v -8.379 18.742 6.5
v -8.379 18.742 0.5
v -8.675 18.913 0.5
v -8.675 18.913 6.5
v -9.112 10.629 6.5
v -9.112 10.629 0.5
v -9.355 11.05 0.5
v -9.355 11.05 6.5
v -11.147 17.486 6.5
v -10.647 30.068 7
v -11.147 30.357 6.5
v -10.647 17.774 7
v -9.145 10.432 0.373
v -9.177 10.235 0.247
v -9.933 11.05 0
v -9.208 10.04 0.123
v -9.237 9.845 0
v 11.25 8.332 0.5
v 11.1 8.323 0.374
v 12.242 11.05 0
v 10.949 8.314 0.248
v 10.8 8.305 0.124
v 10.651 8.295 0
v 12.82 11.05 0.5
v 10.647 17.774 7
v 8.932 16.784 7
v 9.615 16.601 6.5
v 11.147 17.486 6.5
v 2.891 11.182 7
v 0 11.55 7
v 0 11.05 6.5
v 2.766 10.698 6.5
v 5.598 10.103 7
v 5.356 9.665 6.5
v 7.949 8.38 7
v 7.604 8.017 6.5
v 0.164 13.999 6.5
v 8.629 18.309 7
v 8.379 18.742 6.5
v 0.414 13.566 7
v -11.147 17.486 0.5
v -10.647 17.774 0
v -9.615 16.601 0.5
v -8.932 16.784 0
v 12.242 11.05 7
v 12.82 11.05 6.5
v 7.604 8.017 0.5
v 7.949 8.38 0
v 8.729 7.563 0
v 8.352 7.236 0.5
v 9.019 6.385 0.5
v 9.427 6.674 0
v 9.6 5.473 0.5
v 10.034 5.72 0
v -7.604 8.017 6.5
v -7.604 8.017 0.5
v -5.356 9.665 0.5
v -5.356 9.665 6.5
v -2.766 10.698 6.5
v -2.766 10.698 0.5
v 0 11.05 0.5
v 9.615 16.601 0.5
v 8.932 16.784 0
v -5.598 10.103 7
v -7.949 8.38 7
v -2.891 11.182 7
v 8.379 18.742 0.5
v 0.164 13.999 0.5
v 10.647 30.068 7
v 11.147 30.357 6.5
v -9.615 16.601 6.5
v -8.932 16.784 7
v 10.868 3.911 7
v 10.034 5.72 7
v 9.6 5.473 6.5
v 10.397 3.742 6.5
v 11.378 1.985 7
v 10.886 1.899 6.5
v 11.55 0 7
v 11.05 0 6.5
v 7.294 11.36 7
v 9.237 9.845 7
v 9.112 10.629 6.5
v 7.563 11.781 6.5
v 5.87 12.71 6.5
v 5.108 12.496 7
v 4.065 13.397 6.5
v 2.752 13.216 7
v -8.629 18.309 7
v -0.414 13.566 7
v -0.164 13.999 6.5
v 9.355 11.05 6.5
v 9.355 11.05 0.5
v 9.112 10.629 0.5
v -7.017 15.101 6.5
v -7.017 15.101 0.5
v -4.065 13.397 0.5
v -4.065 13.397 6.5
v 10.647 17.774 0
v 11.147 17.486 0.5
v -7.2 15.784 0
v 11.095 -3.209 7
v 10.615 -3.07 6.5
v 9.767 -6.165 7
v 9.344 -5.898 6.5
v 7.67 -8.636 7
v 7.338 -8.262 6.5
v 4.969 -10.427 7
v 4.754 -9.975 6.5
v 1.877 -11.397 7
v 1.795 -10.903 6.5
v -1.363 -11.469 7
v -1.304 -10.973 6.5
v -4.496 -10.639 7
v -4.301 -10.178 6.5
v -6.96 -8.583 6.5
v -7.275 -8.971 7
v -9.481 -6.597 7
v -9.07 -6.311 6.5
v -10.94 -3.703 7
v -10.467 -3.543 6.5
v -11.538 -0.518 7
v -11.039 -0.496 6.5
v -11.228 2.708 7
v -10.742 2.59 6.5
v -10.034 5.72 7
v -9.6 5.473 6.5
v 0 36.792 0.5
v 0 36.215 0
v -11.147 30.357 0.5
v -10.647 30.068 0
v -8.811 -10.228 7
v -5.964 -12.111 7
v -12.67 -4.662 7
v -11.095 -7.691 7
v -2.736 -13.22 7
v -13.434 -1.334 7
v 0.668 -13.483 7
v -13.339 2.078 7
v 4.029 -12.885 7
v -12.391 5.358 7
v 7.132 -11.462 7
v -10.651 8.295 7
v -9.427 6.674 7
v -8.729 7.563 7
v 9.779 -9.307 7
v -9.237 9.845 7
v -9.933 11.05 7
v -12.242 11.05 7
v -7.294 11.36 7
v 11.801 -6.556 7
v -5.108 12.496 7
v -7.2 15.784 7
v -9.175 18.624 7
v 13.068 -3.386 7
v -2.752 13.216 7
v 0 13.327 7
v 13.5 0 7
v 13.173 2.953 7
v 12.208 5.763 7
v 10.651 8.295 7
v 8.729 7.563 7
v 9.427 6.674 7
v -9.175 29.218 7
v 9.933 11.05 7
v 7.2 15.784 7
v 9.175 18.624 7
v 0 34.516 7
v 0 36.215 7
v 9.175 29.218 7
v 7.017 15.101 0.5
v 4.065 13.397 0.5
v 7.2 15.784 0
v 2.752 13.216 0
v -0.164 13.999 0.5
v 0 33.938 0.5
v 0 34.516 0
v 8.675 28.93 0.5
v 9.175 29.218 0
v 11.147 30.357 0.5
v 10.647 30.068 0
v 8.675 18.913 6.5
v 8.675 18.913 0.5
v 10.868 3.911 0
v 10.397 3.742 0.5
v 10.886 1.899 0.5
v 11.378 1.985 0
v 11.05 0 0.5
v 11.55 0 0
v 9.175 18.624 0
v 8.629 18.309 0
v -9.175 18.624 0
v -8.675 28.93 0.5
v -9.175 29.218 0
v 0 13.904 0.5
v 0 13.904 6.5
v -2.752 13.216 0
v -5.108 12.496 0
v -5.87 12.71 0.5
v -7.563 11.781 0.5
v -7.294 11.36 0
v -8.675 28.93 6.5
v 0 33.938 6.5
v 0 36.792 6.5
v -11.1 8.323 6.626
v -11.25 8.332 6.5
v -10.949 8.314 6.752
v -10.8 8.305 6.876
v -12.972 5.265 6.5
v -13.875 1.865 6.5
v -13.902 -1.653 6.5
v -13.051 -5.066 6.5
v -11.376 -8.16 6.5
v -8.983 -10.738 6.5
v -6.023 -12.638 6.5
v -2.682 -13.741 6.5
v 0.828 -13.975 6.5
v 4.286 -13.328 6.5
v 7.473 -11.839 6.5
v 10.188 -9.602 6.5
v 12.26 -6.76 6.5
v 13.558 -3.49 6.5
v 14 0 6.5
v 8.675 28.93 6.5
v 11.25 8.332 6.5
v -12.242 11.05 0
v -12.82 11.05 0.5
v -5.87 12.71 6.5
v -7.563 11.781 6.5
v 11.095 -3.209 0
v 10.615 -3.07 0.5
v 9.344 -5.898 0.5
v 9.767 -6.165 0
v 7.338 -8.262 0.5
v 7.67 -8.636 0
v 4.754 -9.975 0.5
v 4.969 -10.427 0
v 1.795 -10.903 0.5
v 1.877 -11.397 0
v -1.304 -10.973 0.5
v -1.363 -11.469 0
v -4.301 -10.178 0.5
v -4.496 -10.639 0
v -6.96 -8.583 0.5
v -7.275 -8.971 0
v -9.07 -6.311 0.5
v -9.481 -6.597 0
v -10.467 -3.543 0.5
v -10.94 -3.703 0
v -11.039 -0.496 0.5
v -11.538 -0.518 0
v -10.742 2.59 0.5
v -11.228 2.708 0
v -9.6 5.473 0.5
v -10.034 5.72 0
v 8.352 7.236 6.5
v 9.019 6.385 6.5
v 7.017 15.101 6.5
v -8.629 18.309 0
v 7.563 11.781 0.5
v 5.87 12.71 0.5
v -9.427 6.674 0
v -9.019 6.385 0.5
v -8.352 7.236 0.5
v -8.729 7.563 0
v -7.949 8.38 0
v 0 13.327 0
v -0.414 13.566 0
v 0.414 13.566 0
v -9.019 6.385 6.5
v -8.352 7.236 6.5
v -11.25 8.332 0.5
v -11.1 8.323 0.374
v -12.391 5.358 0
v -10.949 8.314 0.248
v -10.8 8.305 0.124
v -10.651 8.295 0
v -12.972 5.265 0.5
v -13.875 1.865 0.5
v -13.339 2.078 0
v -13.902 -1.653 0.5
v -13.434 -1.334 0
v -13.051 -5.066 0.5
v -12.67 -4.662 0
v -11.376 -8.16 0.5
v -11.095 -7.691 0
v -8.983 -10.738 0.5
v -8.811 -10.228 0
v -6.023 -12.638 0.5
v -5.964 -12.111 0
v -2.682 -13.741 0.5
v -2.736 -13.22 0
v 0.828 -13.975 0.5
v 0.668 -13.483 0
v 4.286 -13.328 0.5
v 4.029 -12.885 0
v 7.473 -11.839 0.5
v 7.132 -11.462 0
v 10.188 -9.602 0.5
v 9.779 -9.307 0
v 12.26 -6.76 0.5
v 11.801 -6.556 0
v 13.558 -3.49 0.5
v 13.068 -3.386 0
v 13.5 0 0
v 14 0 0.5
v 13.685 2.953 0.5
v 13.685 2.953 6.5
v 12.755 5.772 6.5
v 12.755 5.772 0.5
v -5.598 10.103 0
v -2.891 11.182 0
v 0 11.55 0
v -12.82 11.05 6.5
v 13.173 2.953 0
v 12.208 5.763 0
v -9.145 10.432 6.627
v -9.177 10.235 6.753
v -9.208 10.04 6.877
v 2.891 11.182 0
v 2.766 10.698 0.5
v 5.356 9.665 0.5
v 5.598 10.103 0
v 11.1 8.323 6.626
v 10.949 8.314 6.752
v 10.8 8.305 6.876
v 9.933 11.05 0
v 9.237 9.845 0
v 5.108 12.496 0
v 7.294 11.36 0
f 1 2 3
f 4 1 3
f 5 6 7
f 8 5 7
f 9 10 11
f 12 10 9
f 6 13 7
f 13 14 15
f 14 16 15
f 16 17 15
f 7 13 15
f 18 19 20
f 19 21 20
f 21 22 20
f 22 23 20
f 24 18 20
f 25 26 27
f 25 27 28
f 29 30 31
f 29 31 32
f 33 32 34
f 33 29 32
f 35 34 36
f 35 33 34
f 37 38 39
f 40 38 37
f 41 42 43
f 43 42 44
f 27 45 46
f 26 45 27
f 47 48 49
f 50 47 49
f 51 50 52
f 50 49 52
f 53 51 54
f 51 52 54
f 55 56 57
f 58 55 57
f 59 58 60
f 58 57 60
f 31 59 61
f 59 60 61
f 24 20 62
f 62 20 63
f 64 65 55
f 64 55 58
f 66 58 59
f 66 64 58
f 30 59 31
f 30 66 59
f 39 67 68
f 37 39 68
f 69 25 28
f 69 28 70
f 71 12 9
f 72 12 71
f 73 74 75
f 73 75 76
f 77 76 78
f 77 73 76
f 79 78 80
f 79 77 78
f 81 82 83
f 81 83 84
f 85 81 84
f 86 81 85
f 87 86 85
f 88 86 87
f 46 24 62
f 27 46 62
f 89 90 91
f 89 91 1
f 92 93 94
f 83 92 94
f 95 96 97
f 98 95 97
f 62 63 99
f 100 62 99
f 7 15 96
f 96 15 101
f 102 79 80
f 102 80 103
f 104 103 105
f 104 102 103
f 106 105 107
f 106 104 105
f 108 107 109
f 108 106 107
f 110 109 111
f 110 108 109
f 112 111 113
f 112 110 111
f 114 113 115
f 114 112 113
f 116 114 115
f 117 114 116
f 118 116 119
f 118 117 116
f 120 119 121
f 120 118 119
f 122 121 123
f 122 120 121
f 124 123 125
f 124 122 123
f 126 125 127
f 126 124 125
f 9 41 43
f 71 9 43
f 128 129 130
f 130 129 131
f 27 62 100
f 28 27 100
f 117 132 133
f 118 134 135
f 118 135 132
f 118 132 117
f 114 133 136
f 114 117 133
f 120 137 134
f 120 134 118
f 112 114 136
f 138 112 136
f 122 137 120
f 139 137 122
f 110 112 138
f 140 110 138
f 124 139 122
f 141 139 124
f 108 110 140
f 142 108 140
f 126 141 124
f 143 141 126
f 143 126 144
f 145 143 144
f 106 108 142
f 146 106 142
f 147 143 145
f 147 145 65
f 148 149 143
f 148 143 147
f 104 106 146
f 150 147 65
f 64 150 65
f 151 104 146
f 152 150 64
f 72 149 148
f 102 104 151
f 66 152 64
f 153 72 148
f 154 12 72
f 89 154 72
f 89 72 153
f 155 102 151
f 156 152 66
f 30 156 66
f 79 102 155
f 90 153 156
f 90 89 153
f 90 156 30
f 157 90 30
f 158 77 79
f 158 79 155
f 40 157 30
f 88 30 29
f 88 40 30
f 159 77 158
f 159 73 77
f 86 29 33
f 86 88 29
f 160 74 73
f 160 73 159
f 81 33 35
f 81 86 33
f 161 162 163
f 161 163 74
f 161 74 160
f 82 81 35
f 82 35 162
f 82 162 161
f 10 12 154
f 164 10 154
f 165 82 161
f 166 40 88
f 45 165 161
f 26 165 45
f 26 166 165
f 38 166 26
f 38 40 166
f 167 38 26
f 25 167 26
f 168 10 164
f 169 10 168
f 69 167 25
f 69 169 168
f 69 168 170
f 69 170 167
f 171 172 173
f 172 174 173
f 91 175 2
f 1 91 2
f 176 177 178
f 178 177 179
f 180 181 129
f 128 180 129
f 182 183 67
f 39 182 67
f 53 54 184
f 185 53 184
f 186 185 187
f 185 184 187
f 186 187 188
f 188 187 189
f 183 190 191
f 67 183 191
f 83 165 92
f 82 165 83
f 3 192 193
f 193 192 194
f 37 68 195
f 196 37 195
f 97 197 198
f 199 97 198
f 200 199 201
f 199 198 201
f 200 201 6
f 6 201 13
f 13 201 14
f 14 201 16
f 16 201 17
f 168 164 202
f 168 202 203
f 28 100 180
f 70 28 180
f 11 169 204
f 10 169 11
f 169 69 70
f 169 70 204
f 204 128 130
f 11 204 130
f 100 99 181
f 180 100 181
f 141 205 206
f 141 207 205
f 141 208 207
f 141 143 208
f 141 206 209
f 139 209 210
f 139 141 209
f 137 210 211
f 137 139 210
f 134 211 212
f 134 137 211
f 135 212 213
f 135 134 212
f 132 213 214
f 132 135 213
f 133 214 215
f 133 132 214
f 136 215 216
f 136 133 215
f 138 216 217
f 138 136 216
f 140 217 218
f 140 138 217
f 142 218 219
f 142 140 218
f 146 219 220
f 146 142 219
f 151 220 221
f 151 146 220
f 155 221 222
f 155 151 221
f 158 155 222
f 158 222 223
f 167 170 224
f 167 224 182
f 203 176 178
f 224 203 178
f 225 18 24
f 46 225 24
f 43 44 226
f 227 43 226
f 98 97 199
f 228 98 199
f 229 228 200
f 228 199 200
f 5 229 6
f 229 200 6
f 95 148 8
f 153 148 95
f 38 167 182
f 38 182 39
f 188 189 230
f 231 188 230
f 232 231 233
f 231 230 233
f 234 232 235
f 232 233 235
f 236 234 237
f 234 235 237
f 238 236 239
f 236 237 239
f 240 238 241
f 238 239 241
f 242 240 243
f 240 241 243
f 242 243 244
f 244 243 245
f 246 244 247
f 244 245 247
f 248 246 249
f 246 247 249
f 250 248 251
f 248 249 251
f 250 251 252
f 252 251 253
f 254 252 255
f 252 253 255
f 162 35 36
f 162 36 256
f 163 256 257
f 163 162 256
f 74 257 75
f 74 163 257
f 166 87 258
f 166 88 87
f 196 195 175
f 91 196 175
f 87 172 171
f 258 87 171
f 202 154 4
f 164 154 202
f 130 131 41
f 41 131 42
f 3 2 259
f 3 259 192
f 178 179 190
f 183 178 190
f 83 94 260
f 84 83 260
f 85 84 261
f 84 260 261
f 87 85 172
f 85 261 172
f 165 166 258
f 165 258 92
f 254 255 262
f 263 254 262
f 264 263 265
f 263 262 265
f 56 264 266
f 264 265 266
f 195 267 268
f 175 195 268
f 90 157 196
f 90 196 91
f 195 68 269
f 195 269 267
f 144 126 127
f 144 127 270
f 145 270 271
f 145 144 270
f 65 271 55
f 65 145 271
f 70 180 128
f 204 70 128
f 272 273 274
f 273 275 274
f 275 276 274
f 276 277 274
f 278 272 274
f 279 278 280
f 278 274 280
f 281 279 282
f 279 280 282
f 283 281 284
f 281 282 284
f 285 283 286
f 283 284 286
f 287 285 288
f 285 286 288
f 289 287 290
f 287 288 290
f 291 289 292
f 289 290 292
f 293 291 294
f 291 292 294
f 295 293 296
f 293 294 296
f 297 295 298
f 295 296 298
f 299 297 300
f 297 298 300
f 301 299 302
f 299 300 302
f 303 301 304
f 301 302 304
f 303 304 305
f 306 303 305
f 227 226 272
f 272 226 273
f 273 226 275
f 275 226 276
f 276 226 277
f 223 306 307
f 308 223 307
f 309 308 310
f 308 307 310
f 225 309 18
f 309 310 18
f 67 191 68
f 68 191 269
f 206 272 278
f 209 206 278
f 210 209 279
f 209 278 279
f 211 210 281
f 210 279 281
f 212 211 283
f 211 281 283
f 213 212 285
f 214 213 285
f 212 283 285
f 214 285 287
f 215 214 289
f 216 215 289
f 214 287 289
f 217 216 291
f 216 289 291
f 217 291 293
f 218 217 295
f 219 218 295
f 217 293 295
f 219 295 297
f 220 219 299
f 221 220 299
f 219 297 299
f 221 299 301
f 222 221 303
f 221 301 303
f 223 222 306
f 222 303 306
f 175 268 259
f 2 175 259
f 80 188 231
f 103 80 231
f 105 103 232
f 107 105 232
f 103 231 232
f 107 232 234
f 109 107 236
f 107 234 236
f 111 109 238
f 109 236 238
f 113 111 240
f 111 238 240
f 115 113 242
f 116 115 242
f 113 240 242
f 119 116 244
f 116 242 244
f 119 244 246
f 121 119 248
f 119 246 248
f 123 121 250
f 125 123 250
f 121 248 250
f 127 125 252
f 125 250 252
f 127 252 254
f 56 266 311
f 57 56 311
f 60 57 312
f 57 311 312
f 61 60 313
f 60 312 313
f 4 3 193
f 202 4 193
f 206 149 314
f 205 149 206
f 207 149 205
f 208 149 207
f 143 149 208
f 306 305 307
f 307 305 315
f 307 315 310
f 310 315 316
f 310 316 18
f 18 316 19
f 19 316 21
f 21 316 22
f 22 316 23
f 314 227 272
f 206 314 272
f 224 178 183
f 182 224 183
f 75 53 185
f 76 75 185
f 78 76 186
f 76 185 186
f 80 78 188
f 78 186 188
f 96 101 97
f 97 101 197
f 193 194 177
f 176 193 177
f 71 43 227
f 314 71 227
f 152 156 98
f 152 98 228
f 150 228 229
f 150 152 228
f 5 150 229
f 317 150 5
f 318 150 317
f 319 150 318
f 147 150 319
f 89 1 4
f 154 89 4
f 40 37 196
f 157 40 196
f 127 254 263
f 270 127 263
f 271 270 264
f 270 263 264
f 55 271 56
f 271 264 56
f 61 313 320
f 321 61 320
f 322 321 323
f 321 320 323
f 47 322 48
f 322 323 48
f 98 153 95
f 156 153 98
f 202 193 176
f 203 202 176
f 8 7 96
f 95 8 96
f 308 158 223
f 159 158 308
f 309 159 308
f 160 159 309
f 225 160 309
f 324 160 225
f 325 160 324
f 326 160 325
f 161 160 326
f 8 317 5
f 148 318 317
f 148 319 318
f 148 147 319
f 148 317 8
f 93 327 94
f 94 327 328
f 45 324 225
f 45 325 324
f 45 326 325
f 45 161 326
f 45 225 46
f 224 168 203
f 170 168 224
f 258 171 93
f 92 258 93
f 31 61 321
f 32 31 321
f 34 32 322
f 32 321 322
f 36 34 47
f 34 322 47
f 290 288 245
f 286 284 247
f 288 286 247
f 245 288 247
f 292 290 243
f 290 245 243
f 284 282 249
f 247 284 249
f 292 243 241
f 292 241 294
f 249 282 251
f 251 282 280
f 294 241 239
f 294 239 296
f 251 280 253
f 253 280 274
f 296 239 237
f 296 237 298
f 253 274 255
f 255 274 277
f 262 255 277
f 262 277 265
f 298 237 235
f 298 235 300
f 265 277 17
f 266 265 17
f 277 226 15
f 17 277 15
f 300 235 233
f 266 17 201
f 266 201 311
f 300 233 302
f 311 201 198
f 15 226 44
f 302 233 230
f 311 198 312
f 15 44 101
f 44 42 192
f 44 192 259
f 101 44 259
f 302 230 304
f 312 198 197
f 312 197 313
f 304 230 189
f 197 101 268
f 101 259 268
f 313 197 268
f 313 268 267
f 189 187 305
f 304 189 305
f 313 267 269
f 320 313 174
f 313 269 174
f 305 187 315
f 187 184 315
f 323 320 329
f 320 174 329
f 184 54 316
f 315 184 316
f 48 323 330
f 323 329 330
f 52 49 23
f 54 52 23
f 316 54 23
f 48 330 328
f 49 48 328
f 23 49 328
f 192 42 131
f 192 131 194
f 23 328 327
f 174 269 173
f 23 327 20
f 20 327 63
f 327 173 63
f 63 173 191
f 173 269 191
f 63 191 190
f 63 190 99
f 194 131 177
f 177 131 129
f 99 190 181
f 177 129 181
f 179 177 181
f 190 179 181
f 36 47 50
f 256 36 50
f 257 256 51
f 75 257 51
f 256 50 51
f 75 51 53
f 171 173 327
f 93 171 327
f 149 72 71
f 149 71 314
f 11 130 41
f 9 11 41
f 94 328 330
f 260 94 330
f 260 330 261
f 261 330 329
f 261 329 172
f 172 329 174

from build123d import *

# Parameters (mm, degrees)
F1_DEPTH = 7
F2_SIZE  = 0.5


with BuildPart() as f1:
    # F0 (on Top) → F1 (new body)
    with BuildSketch(Plane.XY):
        Polygon((8.378810594, 18.741624645), (9.614679115, 16.6010375752), (11.146737042, 17.4855716318), (11.146737042, 30.3567148954), (0, 36.7922865272), (-11.146737042, 30.3567148954), (-11.146737042, 17.4855716318), (-9.614679115, 16.6010375752), (-8.378810594, 18.741624645), (-8.675, 18.9126296784), (-8.675, 28.9296568488), (0, 33.938170434), (8.675, 28.9296568488), (8.675, 18.9126296784), align=None)
        with BuildLine():
            Line((-4.0649183257, 13.3968816896), (0, 11.05))
            Line((0, 11.05), (4.0649183257, 13.3968816896))
            ThreePointArc((4.0649183257, 13.3968816896), (2.1359865208, 13.8360963275), (0.1644037795, 13.9990346595))
            Line((0.1644037795, 13.9990346595), (0, 13.9041160931))
            Line((0, 13.9041160931), (-0.1644037795, 13.9990346595))
            ThreePointArc((-0.1644037795, 13.9990346595), (-2.1359865208, 13.8360963275), (-4.0649183257, 13.3968816896))
        make_face()
        with BuildLine():
            ThreePointArc((9.1121955979, 10.6286354433), (10.2458784466, 9.5405437401), (11.2504851637, 8.3322616126))
            Line((11.2504851637, 8.3322616126), (12.8195721533, 11.05))
            Line((12.8195721533, 11.05), (9.614679115, 16.6010375752))
            Line((9.614679115, 16.6010375752), (7.0166029036, 15.1010375752))
            Line((7.0166029036, 15.1010375752), (9.3554705381, 11.05))
            Line((9.3554705381, 11.05), (9.1121955979, 10.6286354433))
        make_face()
        with BuildLine():
            ThreePointArc((7.6044558373, 8.0171535733), (8.6955707884, 6.8183244762), (9.5995515555, 5.4727607232))
            Line((9.5995515555, 5.4727607232), (11.2504851637, 8.3322616126))
            ThreePointArc((11.2504851637, 8.3322616126), (10.2458784466, 9.5405437401), (9.1121955979, 10.6286354433))
            Line((9.1121955979, 10.6286354433), (7.6044558373, 8.0171535733))
        make_face()
        with BuildLine():
            ThreePointArc((0, 11.05), (4.0934675408, 10.2638210961), (7.6044558373, 8.0171535733))
            Line((7.6044558373, 8.0171535733), (9.1121955979, 10.6286354433))
            ThreePointArc((9.1121955979, 10.6286354433), (6.7323754841, 12.2749794436), (4.0649183257, 13.3968816896))
            Line((4.0649183257, 13.3968816896), (0, 11.05))
        make_face()
        with BuildLine():
            Line((-9.1121955979, 10.6286354433), (-7.6044558373, 8.0171535733))
            ThreePointArc((-7.6044558373, 8.0171535733), (-4.0934675408, 10.2638210961), (0, 11.05))
            Line((0, 11.05), (-4.0649183257, 13.3968816896))
            ThreePointArc((-4.0649183257, 13.3968816896), (-6.7323754841, 12.2749794436), (-9.1121955979, 10.6286354433))
        make_face()
        with BuildLine():
            ThreePointArc((9.5995515555, 5.4727607232), (10.6812345889, 2.8308528142), (11.05, 0))
            ThreePointArc((11.05, 0), (-2.8308528142, -10.6812345889), (-9.5995515555, 5.4727607232))
            Line((-9.5995515555, 5.4727607232), (-11.2504851637, 8.3322616126))
            ThreePointArc((-11.2504851637, 8.3322616126), (-4.3870951499, -13.2948635249), (14, 0))
            ThreePointArc((14, 0), (13.2948635249, 4.3870951499), (11.2504851637, 8.3322616126))
            Line((11.2504851637, 8.3322616126), (9.5995515555, 5.4727607232))
        make_face()
        with BuildLine():
            Line((-11.2504851637, 8.3322616126), (-9.5995515555, 5.4727607232))
            ThreePointArc((-9.5995515555, 5.4727607232), (-8.6955707884, 6.8183244762), (-7.6044558373, 8.0171535733))
            Line((-7.6044558373, 8.0171535733), (-9.1121955979, 10.6286354433))
            ThreePointArc((-9.1121955979, 10.6286354433), (-10.2458784466, 9.5405437401), (-11.2504851637, 8.3322616126))
        make_face()
        with BuildLine():
            Line((-12.8195721533, 11.05), (-11.2504851637, 8.3322616126))
            ThreePointArc((-11.2504851637, 8.3322616126), (-10.2458784466, 9.5405437401), (-9.1121955979, 10.6286354433))
            Line((-9.1121955979, 10.6286354433), (-9.3554705381, 11.05))
            Line((-9.3554705381, 11.05), (-7.0166029036, 15.1010375752))
            Line((-7.0166029036, 15.1010375752), (-9.614679115, 16.6010375752))
            Line((-9.614679115, 16.6010375752), (-12.8195721533, 11.05))
        make_face()
        with BuildLine():
            Line((-7.0166029036, 15.1010375752), (-4.0649183257, 13.3968816896))
            ThreePointArc((-4.0649183257, 13.3968816896), (-2.1359865208, 13.8360963275), (-0.1644037795, 13.9990346595))
            Line((-0.1644037795, 13.9990346595), (-5.7807343826, 17.241624645))
            Line((-5.7807343826, 17.241624645), (-7.0166029036, 15.1010375752))
        make_face()
        Polygon((-8.378810594, 18.741624645), (-9.614679115, 16.6010375752), (-7.0166029036, 15.1010375752), (-5.7807343826, 17.241624645), align=None)
        Polygon((7.0166029036, 15.1010375752), (9.614679115, 16.6010375752), (8.378810594, 18.741624645), (5.7807343826, 17.241624645), align=None)
        with BuildLine():
            ThreePointArc((0.1644037795, 13.9990346595), (2.1359865208, 13.8360963275), (4.0649183257, 13.3968816896))
            Line((4.0649183257, 13.3968816896), (7.0166029036, 15.1010375752))
            Line((7.0166029036, 15.1010375752), (5.7807343826, 17.241624645))
            Line((5.7807343826, 17.241624645), (0.1644037795, 13.9990346595))
        make_face()
    extrude(amount=F1_DEPTH)

    # F2
    f2_edges = [f1.edges().sort_by_distance(p)[0] for p in [
        (-11.146737, 23.921143, 7),
        (-5.573369, 33.574501, 7),
        (5.573369, 33.574501, 7),
        (11.146737, 23.921143, 7),
        (10.380708, 17.043305, 7),
        (11.217126, 13.825519, 7),
        (12.035029, 9.691131, 7),
        (0, -14, 7),
        (-12.035029, 9.691131, 7),
        (-11.217126, 13.825519, 7),
        (-10.380708, 17.043305, 7),
        (9.599552, -5.472761, 7),
        (-6.732375, 12.274979, 7),
        (-9.233833, 10.839318, 7),
        (-8.186037, 13.075519, 7),
        (-5.540761, 14.24896, 7),
        (4.3375, 16.408373, 7),
        (-4.3375, 16.408373, 7),
        (-8.675, 23.921143, 7),
        (-4.3375, 31.433914, 7),
        (4.3375, 31.433914, 7),
        (8.675, 23.921143, 7),
        (8.186037, 13.075519, 7),
        (9.233833, 10.839318, 7),
        (6.732375, 12.274979, 7),
        (5.540761, 14.24896, 7),
        (11.217126, 13.825519, 0),
        (10.380708, 17.043305, 0),
        (11.146737, 23.921143, 0),
        (5.573369, 33.574501, 0),
        (-5.573369, 33.574501, 0),
        (-11.146737, 23.921143, 0),
        (-10.380708, 17.043305, 0),
        (-11.217126, 13.825519, 0),
        (-12.035029, 9.691131, 0),
        (0, -14, 0),
        (12.035029, 9.691131, 0),
        (9.599552, -5.472761, 0),
        (-6.732375, 12.274979, 0),
        (-9.233833, 10.839318, 0),
        (-8.186037, 13.075519, 0),
        (-5.540761, 14.24896, 0),
        (4.3375, 16.408373, 0),
        (-4.3375, 16.408373, 0),
        (-8.675, 23.921143, 0),
        (-4.3375, 31.433914, 0),
        (4.3375, 31.433914, 0),
        (8.675, 23.921143, 0),
        (8.186037, 13.075519, 0),
        (9.233833, 10.839318, 0),
        (6.732375, 12.274979, 0),
        (5.540761, 14.24896, 0),
    ]]
    chamfer(f2_edges, length=F2_SIZE)


solid = f1.part
